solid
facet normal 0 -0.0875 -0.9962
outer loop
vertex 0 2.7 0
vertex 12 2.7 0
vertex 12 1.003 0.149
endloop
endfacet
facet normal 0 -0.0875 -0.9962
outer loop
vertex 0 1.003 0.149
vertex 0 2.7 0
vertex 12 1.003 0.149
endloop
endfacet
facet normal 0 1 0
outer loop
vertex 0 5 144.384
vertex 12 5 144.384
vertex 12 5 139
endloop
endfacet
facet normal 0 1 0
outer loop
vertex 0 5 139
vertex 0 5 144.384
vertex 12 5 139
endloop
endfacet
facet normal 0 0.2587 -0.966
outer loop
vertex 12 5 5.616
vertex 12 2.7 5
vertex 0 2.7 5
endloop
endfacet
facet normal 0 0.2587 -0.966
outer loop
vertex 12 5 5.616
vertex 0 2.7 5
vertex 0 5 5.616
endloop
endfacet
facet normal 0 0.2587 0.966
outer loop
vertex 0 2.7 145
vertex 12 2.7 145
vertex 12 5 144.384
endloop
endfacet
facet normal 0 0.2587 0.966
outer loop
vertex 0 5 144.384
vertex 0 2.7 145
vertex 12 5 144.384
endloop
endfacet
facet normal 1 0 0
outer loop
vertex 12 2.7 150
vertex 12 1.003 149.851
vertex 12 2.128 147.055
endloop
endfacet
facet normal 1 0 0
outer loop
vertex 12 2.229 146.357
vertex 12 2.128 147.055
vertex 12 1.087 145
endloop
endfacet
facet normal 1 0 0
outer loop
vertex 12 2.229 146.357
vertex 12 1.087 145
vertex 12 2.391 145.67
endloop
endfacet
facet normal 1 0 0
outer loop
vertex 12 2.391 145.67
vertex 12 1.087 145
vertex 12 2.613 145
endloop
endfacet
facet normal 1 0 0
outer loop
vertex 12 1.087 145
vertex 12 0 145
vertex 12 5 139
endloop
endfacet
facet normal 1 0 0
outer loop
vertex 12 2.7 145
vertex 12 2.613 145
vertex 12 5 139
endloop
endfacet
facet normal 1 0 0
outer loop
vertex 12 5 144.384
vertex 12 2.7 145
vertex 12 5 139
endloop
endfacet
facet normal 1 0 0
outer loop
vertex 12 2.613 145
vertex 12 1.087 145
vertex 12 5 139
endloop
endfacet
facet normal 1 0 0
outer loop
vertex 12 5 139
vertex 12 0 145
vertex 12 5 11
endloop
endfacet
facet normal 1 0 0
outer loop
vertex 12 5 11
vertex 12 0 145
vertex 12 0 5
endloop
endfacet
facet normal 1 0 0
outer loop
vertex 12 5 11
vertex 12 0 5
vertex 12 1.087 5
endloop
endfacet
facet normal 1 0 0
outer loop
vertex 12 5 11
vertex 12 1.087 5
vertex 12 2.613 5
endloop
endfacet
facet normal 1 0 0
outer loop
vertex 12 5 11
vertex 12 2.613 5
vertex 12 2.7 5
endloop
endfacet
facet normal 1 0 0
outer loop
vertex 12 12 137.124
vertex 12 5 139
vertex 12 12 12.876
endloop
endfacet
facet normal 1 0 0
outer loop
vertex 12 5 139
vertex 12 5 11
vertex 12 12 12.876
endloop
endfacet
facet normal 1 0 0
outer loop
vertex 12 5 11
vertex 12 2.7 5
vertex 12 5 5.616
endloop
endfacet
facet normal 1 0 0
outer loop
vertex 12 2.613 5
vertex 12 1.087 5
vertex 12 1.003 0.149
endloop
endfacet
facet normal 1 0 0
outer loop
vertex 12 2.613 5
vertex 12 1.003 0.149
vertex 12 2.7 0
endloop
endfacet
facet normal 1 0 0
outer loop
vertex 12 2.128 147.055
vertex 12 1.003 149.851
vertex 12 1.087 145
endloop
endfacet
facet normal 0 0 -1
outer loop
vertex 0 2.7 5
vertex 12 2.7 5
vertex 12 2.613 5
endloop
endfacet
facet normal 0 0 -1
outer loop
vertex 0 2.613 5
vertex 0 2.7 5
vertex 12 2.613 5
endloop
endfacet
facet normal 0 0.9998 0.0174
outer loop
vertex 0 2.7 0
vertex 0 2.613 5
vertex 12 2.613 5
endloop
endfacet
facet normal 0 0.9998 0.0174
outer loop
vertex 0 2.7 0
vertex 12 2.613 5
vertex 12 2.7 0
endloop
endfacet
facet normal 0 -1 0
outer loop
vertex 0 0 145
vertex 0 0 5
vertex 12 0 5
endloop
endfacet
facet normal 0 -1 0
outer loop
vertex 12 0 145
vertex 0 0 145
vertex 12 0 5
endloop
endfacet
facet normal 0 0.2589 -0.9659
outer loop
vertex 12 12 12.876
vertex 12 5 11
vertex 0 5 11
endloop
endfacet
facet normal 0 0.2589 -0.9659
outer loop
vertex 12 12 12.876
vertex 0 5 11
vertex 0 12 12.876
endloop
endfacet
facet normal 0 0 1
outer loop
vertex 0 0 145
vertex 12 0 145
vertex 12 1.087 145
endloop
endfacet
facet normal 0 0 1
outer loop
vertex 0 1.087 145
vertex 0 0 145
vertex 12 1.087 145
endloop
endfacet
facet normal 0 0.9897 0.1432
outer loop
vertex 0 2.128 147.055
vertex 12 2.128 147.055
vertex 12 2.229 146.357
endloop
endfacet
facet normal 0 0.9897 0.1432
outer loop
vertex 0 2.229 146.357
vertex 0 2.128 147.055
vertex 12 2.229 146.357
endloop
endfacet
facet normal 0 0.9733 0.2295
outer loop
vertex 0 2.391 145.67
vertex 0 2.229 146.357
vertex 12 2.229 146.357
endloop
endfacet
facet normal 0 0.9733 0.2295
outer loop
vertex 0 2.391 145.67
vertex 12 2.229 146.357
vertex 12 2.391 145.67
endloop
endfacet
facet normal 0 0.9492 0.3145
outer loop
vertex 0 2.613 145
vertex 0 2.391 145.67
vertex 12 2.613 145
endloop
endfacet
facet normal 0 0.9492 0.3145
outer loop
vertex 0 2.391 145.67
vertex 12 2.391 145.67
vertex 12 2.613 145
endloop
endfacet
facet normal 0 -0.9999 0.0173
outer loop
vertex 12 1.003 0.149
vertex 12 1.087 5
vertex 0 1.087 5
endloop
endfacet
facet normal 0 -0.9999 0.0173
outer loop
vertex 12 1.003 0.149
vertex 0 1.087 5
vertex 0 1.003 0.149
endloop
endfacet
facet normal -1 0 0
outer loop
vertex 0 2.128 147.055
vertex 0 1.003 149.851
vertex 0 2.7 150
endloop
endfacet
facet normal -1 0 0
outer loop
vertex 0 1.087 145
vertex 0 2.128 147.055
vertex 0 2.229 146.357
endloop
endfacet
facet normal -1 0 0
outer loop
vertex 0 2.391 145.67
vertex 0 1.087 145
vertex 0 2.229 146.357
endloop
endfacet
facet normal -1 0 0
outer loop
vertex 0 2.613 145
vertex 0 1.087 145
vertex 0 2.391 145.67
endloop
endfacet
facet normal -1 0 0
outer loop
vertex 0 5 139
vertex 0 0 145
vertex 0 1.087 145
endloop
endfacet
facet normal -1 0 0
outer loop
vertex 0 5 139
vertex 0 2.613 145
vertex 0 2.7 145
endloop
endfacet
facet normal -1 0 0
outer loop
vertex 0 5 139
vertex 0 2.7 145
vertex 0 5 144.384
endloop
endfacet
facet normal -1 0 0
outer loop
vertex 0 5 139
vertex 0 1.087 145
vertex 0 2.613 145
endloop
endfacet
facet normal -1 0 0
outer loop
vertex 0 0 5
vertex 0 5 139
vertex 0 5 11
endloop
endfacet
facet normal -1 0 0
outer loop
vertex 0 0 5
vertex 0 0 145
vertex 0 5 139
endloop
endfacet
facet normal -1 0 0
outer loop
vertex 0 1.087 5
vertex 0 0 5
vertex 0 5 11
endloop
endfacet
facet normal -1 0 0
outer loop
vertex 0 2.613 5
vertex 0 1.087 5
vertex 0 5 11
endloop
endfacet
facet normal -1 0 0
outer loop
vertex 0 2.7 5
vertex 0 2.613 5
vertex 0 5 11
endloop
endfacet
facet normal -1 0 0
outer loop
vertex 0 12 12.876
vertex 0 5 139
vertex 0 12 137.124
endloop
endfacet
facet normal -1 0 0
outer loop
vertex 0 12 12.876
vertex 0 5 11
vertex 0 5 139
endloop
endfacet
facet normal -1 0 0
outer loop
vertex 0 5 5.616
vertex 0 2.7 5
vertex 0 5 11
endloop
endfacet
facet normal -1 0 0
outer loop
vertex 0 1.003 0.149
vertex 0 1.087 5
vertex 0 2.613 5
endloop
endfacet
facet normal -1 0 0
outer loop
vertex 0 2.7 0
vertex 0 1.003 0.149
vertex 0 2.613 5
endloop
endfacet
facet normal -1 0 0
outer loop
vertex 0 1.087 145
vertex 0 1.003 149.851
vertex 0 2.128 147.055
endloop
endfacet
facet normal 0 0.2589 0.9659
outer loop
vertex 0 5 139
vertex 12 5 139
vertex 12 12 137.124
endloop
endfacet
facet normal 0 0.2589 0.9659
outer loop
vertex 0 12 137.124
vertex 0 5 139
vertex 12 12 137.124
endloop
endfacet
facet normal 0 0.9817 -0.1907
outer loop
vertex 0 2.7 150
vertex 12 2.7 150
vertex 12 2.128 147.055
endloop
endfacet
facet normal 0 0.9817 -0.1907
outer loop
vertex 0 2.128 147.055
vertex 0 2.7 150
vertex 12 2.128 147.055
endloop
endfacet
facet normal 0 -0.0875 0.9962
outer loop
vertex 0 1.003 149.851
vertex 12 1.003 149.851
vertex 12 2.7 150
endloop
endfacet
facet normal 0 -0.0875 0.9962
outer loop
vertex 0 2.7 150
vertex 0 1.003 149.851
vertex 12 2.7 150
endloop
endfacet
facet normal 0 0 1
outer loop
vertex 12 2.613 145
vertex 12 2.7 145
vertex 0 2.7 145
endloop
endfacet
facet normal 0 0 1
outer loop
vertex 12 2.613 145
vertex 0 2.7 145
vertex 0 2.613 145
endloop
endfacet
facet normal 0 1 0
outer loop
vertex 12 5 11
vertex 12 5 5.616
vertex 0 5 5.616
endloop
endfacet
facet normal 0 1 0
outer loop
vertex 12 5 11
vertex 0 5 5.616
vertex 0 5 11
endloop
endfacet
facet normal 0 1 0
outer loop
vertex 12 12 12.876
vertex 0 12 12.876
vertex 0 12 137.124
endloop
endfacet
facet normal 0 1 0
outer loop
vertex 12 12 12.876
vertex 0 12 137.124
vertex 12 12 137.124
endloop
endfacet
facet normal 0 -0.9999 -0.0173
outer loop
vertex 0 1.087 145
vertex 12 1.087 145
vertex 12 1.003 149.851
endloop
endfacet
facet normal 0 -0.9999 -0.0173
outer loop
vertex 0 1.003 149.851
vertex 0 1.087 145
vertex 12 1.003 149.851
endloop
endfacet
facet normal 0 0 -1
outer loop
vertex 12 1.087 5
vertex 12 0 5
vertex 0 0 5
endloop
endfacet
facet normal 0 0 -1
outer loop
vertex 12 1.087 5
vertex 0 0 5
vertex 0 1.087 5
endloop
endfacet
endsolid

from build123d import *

# Parameters (mm, degrees)
SKETCH1_W          = 12
SKETCH1_H          = 12
EXTRUDE1_DEPTH     = 150
SKETCH2_W          = 5
SKETCH2_H          = 1
CUT_EXTRUDE2_DEPTH = 151.956947505
CUT_EXTRUDE3_DEPTH = 151.956947505
CUT_EXTRUDE4_DEPTH = 151.956947505
CUT_EXTRUDE5_DEPTH = 151.956947505


with BuildPart() as part:
    # Sketch1 → Extrude1 (new body)
    with BuildSketch(Plane.XY):
        with Locations((6, 6)):
            Rectangle(SKETCH1_W, SKETCH1_H)
    extrude(amount=EXTRUDE1_DEPTH)

    # Sketch2 → Cut-Extrude2 (cut, through all)
    with BuildSketch(Plane(origin=(12, 0, 0), x_dir=(0, 0, -1), z_dir=(1, 0, 0))):
        with Locations((-2.5, 0.5)):
            Rectangle(SKETCH2_W, SKETCH2_H)
        with Locations((-147.5, 0.5)):
            Rectangle(SKETCH2_W, SKETCH2_H)
    extrude(amount=-CUT_EXTRUDE2_DEPTH, mode=Mode.SUBTRACT)

    # Sketch3 → Cut-Extrude3 (cut, through all)
    with BuildSketch(Plane(origin=(12, 0, 0), x_dir=(0, 0, -1), z_dir=(1, 0, 0))):
        Polygon((-150, 2.7), (-145, 2.7), (-144.383716857, 5), (-139, 5), (-137.124355653, 12), (-150, 12), align=None)
        Polygon((0, 2.7), (-5, 2.7), (-5.616283143, 5), (-11, 5), (-12.875644347, 12), (0, 12), align=None)
    extrude(amount=-CUT_EXTRUDE3_DEPTH, mode=Mode.SUBTRACT)

    # Sketch4 → Cut-Extrude4 (cut, through all)
    with BuildSketch(Plane(origin=(12, 0, 0), x_dir=(0, 0, -1), z_dir=(1, 0, 0))):
        Polygon((-145, 1), (-145, 1.087275325), (-150, 1), align=None)
        Polygon((-145, 2.7), (-145, 2.612724675), (-150, 2.7), align=None)
        Polygon((-5, 2.7), (-5, 2.612724675), (0, 2.7), align=None)
        Polygon((-5, 1), (-5, 1.087275325), (0, 1), align=None)
    extrude(amount=-CUT_EXTRUDE4_DEPTH, mode=Mode.SUBTRACT)

    # Sketch5 → Cut-Extrude5 (cut, through all)
    with BuildSketch(Plane(origin=(12, 0, 0), x_dir=(0, 0, -1), z_dir=(1, 0, 0))):
        Polygon((-149.851496055, 1.002592146), (-150, 2.7), (-150, 1), align=None)
        with BuildLine():
            Line((-145, 2.612724675), (-150, 2.7))
            Line((-150, 2.7), (-147.05511845, 2.127573014))
            ThreePointArc((-147.05511845, 2.127573014), (-146.011481885, 2.302044703), (-145, 2.612724675))
        make_face()
        Polygon((0, 1), (0, 2.7), (-0.148503945, 1.002592146), align=None)
    extrude(amount=-CUT_EXTRUDE5_DEPTH, mode=Mode.SUBTRACT)


solid = part.part
